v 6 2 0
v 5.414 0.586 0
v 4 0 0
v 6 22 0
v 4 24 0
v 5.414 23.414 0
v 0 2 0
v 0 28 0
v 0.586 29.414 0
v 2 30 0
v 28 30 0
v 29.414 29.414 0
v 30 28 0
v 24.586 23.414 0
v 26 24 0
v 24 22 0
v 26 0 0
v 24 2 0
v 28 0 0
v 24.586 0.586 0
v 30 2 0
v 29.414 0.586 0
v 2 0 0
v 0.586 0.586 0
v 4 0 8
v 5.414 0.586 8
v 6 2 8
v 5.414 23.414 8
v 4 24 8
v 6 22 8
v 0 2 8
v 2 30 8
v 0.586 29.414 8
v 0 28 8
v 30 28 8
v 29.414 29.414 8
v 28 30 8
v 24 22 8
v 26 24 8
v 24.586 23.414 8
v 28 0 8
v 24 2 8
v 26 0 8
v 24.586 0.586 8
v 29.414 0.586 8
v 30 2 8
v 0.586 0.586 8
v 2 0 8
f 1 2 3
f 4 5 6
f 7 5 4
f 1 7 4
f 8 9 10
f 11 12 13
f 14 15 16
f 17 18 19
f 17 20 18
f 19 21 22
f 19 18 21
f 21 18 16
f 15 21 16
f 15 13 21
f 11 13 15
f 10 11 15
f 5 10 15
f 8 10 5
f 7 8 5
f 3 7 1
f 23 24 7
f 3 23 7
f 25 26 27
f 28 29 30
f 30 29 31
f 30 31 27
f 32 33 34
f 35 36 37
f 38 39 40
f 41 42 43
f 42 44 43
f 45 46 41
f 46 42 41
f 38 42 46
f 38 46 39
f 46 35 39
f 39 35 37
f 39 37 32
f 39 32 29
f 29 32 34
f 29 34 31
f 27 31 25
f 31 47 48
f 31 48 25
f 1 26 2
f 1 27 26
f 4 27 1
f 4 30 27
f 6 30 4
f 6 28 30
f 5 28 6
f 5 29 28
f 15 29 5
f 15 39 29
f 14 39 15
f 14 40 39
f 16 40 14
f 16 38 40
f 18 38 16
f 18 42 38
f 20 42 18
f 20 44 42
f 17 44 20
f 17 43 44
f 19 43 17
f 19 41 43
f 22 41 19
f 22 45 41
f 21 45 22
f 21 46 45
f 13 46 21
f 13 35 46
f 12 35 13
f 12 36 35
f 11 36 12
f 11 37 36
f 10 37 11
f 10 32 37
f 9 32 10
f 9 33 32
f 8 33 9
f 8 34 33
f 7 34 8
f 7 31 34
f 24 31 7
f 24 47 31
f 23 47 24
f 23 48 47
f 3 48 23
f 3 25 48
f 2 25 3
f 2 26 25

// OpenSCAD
$fn = 32;

// ----------------------------------------------------------------------
// Clip blank: staple clip, 8 mm thick
// ----------------------------------------------------------------------

// --- parameters (mm) ---
profile_height = 8;       // extrusion height
profile_points = 24;      // points of the closed outline

profile = [[0, 2], [0.586, 0.586], [2, 0], [4, 0], [5.414, 0.586], [6, 2], [6, 22], [5.414, 23.414], [4, 24], [26, 24], [24.586, 23.414], [24, 22], [24, 2], [24.586, 0.586], [26, 0], [28, 0], [29.414, 0.586], [30, 2], [30, 28], [29.414, 29.414], [28, 30], [2, 30], [0.586, 29.414], [0, 28]];  // single closed polygon, 24 points, counter clockwise

// --- the one profile operation ---
linear_extrude(height = profile_height) polygon(points = profile);
